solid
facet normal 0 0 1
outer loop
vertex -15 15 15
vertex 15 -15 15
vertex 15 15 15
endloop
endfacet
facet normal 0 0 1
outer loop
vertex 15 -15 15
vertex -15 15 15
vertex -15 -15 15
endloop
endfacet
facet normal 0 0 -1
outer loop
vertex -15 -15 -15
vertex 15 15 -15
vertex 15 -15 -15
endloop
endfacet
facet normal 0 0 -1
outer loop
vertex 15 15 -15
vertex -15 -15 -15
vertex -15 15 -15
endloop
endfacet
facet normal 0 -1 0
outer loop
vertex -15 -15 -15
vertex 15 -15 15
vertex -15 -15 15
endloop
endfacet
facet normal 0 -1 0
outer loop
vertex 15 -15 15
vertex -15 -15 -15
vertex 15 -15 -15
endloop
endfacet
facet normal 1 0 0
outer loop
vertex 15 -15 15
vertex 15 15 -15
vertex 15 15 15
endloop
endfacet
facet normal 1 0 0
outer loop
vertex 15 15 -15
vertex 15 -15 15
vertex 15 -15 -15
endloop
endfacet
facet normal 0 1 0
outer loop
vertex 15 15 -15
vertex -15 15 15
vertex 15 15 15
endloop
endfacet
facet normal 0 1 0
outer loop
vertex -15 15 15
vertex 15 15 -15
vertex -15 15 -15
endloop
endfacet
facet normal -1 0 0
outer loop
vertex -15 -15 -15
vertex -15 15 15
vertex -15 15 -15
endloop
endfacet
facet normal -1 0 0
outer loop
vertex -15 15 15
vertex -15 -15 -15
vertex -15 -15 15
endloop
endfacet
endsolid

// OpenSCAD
/* [Dimensions] */
// Cube side length
size = 30; // [5:100]

cube(size, center = true);
